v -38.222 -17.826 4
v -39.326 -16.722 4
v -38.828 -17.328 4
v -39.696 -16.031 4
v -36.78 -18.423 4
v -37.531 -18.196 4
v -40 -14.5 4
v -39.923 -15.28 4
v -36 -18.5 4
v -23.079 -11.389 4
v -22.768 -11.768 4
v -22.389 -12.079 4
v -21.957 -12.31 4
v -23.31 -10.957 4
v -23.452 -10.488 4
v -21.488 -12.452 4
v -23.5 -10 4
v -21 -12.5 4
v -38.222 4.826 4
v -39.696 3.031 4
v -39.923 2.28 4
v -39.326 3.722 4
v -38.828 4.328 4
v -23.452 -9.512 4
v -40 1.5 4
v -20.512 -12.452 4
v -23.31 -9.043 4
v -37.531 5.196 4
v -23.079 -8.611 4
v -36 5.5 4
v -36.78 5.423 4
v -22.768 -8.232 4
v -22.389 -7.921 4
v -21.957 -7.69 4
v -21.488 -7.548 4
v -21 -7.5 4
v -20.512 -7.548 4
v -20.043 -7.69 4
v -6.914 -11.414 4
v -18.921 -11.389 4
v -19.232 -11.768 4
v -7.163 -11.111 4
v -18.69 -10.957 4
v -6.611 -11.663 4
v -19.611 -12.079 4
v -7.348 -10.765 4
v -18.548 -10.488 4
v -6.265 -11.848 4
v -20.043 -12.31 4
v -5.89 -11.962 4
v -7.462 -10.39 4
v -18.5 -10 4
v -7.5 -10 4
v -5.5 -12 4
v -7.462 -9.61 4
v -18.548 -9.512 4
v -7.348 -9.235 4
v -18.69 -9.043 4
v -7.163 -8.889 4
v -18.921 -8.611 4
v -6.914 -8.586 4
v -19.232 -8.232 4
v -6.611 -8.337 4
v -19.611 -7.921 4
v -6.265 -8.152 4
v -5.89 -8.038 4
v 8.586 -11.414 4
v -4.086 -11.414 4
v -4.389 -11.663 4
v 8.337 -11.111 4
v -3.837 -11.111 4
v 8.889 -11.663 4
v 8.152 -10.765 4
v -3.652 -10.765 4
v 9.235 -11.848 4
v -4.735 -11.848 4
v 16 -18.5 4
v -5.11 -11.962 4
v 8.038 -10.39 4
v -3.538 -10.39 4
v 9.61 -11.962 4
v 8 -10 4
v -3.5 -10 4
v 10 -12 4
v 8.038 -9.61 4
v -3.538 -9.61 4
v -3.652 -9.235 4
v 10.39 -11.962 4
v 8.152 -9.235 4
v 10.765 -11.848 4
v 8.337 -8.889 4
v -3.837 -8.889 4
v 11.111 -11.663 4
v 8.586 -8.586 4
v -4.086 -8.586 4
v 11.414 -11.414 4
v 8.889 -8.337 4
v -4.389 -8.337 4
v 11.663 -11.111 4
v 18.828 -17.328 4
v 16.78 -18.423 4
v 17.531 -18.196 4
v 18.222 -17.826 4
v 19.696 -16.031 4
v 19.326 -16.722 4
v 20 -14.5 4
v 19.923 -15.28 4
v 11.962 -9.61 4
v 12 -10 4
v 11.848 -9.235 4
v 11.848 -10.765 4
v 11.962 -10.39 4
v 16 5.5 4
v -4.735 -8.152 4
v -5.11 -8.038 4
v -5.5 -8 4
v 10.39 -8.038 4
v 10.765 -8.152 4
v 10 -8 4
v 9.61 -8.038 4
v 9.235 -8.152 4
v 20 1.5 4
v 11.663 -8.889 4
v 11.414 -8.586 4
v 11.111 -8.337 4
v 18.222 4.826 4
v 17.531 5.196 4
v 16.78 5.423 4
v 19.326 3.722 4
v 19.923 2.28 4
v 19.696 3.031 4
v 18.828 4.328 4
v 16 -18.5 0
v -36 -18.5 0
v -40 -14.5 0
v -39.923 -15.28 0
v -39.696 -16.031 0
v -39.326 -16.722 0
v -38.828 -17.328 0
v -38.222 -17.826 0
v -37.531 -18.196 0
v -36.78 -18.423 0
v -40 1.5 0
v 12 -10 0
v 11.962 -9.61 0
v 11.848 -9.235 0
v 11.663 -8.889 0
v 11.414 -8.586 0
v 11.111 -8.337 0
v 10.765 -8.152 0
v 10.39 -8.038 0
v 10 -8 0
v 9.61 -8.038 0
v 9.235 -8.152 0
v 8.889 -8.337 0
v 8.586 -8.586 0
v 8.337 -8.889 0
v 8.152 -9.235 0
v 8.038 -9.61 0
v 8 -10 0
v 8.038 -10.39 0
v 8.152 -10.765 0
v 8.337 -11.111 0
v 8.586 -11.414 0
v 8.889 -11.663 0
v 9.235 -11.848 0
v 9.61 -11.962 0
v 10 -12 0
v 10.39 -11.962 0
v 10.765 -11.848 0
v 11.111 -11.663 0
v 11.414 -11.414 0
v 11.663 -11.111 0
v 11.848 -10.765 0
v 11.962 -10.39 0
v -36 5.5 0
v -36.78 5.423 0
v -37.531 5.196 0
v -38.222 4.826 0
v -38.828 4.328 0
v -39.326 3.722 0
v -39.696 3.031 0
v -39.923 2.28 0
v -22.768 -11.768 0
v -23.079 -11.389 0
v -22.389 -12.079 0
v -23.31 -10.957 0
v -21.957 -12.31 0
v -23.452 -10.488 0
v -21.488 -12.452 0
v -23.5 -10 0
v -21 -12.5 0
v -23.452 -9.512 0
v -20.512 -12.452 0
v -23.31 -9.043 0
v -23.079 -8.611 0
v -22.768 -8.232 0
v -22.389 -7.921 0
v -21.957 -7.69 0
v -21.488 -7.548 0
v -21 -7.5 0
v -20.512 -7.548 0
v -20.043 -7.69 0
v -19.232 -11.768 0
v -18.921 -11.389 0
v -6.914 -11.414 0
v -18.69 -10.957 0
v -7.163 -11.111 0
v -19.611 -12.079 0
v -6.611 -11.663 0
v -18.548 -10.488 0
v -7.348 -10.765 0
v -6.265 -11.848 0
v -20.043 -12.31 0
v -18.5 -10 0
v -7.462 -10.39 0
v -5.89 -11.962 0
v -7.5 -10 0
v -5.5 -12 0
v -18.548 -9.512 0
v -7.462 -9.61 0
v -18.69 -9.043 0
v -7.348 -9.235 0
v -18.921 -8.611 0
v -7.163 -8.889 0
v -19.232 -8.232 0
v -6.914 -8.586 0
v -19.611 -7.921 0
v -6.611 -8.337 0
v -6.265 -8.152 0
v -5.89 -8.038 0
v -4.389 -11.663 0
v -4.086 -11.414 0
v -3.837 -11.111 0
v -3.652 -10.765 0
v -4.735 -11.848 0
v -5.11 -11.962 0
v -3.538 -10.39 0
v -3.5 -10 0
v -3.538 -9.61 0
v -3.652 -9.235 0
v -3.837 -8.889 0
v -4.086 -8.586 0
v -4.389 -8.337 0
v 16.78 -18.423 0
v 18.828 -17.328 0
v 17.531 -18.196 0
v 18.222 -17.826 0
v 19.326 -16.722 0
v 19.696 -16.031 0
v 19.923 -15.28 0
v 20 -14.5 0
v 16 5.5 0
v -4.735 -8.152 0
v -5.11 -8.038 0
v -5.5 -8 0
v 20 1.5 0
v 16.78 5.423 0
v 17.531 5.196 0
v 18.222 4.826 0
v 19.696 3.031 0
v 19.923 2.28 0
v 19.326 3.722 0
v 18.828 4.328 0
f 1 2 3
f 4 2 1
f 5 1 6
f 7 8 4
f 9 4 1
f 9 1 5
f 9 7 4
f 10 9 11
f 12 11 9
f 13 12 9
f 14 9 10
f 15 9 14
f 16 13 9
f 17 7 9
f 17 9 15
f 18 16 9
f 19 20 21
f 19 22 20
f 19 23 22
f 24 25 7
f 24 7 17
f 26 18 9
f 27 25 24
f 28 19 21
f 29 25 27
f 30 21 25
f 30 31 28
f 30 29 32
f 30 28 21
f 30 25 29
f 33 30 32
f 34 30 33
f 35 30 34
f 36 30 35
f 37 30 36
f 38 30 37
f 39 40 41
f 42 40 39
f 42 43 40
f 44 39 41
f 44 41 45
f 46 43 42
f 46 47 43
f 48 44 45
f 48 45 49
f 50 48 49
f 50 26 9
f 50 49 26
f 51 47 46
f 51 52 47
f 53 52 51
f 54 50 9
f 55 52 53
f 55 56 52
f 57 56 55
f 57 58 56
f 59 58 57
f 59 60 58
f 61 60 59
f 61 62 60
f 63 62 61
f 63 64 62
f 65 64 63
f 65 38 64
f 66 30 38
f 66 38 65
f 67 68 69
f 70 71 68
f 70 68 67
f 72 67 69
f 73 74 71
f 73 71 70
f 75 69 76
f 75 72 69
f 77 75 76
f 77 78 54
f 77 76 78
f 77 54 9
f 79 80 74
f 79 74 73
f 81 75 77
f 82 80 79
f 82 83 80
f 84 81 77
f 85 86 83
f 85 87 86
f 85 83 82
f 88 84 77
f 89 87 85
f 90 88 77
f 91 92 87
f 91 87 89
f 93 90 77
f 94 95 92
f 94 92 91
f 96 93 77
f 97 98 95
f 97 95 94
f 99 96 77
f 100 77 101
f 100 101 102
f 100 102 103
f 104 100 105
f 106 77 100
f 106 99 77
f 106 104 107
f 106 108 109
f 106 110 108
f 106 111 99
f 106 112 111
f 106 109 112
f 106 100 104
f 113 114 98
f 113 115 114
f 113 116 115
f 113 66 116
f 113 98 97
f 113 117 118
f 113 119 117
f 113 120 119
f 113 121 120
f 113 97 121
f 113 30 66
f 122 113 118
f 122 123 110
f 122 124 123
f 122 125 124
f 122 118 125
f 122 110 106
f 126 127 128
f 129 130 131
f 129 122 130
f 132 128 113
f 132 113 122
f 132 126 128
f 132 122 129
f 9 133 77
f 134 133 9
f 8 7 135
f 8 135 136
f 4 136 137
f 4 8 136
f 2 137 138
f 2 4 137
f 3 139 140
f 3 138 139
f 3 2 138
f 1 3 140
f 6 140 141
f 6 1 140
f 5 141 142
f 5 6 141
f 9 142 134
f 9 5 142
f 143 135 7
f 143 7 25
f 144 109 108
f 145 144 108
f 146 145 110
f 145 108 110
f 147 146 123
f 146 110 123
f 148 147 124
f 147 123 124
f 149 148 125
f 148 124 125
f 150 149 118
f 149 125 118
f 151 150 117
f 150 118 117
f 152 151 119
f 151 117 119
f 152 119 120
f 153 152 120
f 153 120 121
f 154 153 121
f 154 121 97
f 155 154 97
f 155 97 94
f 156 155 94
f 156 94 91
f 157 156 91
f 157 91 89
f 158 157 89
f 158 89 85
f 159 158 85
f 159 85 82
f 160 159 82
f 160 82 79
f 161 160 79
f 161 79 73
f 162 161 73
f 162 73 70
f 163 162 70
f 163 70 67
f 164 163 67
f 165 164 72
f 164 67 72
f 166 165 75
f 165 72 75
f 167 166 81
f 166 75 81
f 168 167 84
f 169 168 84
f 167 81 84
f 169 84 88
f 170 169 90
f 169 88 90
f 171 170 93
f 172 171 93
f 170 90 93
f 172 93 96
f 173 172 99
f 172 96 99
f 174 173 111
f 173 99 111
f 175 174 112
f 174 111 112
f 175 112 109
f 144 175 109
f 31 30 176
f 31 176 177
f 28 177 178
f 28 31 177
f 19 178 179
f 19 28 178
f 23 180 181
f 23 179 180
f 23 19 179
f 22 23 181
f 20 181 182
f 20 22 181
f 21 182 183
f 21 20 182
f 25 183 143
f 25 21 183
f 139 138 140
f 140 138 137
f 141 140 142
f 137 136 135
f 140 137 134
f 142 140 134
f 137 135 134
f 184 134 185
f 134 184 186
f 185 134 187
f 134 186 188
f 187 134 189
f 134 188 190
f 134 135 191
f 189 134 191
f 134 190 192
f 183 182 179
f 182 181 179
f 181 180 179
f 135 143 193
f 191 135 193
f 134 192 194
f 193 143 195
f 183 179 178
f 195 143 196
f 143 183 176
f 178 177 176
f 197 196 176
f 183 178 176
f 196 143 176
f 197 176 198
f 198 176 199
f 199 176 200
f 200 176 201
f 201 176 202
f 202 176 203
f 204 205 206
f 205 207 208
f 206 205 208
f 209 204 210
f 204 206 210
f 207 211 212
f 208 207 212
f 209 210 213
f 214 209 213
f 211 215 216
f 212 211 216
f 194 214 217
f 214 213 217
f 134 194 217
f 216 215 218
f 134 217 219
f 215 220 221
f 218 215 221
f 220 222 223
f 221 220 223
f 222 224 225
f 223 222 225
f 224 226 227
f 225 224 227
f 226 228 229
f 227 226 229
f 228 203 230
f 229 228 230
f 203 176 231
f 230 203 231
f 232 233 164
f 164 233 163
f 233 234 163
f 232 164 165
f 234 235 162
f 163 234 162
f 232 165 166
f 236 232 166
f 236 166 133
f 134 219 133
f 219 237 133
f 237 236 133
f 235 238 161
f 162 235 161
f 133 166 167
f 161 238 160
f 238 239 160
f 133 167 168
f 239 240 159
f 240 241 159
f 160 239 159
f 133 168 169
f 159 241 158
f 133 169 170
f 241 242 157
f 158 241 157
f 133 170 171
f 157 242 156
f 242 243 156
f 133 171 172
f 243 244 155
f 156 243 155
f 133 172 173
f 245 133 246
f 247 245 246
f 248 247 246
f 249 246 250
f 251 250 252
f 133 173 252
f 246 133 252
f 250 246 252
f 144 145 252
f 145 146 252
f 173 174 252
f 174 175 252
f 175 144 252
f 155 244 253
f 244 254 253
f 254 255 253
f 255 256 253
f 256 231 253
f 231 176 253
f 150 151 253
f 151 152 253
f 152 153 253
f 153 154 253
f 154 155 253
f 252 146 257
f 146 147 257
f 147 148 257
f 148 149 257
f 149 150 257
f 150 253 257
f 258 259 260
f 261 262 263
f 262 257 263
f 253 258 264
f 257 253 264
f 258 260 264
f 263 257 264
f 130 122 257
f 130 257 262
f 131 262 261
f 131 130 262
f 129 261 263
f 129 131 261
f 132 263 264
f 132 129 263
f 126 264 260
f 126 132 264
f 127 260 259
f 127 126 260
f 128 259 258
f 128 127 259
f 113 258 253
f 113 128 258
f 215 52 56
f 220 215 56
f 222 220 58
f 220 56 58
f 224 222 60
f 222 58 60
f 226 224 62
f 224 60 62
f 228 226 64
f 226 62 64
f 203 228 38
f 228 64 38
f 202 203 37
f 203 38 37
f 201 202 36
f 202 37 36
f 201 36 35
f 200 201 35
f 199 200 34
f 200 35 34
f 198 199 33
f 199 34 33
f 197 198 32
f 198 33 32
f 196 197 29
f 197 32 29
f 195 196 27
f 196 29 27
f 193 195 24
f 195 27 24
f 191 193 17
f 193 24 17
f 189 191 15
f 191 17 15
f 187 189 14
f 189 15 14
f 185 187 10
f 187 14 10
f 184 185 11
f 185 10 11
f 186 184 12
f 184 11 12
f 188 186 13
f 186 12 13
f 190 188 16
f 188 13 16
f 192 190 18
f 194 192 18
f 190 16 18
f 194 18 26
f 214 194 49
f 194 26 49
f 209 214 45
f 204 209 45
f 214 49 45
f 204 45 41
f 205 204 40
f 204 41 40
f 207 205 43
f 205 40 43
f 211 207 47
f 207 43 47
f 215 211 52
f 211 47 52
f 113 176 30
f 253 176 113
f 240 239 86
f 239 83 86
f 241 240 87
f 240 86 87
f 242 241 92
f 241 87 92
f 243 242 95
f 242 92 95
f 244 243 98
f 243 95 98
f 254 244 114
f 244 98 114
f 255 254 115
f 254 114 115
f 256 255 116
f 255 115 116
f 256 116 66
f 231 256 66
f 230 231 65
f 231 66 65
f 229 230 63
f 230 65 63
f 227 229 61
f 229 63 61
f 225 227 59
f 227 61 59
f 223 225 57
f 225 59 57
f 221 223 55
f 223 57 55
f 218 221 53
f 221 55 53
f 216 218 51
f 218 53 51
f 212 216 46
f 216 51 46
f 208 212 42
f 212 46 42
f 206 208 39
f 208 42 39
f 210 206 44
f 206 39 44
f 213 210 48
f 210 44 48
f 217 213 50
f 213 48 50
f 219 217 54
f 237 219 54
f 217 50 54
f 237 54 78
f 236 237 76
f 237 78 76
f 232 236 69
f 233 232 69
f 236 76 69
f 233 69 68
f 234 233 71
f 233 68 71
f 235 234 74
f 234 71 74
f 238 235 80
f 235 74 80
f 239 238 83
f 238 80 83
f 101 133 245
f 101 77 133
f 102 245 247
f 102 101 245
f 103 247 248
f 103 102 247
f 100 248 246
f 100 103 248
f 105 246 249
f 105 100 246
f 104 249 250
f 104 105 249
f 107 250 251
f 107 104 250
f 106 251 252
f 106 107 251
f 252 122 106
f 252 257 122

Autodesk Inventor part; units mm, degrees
ref_plane "YZ Plane" through (0, 0, 0) normal (1, 0, 0) x (0, 1, 0)
ref_plane "XZ Plane" through (0, 0, 0) normal (0, 1, 0) x (-1, 0, 0)
ref_plane "XY Plane" through (0, 0, 0) normal (0, 0, 1) x (1, 0, 0)
sketch "Эскиз1" plane through (0, 0, 0) normal (0, 0, 1) x (1, 0, 0)
  line L0 (20, -18.5) -> (20, -13.95) construction
  line L1 (-240, -18.5) -> (20, -18.5) construction
  line L2 (20, -18.5) -> (-40, -18.5)
  line L3 (-40, -18.5) -> (-40, 5.5)
  line L4 (-40, 5.5) -> (20, 5.5)
  line L5 (20, 5.5) -> (20, -18.5)
  point P0 (0, 0)
  dimension "d0" = 60
  dimension "d1" = 24
extrude "Выдавливание1" add sketch "Эскиз1" along normal blind 4
fillet "Сопряжение1" radius 4 4 edges at (-40, 5.5, 2) (-40, -18.5, 2) (20, -18.5, 2) (20, 5.5, 2)
sketch "Эскиз2" plane through (0, 0, 4) normal (0, 0, 1) x (1, 0, 0)
  circle A0 centre (-21, 219) radius 7.5 construction
  line L0 (-21, 219) -> (-21, -6.68) construction
  arc A1 (-40, -14.5) -> (-36, -18.5) centre (-36, -14.5) ccw construction
  arc A2 (20, 1.5) -> (16, 5.5) centre (16, 1.5) ccw construction
  line L1 (-10, -6.5) -> (-40, -6.5) construction
  line L2 (-240, -6.68) -> (20, -6.68) construction
  line L3 (-240, -13.32) -> (20, -13.32) construction
  line L4 (-21, -6.68) -> (-21, -13.32) construction
  line L5 (-21, -13.32) -> (-21, -31) construction
  circle A3 centre (-21, -10) radius 2.5
  circle A4 centre (-5.5, -10) radius 2
  circle A5 centre (10, -10) radius 2
  line L6 (20, -14.5) -> (20, 1.5) projected
  point P0 (0, 0)
  dimension "d5" = 250
  dimension "d6" = 5
  dimension "d7" = 4
  dimension "d8" = 4
  dimension "d9" = 10
  dimension "d10" = 15.5
extrude "Выдавливание2" cut sketch "Эскиз2" against normal blind 4
properties part number "креп. пасс. ролика"
